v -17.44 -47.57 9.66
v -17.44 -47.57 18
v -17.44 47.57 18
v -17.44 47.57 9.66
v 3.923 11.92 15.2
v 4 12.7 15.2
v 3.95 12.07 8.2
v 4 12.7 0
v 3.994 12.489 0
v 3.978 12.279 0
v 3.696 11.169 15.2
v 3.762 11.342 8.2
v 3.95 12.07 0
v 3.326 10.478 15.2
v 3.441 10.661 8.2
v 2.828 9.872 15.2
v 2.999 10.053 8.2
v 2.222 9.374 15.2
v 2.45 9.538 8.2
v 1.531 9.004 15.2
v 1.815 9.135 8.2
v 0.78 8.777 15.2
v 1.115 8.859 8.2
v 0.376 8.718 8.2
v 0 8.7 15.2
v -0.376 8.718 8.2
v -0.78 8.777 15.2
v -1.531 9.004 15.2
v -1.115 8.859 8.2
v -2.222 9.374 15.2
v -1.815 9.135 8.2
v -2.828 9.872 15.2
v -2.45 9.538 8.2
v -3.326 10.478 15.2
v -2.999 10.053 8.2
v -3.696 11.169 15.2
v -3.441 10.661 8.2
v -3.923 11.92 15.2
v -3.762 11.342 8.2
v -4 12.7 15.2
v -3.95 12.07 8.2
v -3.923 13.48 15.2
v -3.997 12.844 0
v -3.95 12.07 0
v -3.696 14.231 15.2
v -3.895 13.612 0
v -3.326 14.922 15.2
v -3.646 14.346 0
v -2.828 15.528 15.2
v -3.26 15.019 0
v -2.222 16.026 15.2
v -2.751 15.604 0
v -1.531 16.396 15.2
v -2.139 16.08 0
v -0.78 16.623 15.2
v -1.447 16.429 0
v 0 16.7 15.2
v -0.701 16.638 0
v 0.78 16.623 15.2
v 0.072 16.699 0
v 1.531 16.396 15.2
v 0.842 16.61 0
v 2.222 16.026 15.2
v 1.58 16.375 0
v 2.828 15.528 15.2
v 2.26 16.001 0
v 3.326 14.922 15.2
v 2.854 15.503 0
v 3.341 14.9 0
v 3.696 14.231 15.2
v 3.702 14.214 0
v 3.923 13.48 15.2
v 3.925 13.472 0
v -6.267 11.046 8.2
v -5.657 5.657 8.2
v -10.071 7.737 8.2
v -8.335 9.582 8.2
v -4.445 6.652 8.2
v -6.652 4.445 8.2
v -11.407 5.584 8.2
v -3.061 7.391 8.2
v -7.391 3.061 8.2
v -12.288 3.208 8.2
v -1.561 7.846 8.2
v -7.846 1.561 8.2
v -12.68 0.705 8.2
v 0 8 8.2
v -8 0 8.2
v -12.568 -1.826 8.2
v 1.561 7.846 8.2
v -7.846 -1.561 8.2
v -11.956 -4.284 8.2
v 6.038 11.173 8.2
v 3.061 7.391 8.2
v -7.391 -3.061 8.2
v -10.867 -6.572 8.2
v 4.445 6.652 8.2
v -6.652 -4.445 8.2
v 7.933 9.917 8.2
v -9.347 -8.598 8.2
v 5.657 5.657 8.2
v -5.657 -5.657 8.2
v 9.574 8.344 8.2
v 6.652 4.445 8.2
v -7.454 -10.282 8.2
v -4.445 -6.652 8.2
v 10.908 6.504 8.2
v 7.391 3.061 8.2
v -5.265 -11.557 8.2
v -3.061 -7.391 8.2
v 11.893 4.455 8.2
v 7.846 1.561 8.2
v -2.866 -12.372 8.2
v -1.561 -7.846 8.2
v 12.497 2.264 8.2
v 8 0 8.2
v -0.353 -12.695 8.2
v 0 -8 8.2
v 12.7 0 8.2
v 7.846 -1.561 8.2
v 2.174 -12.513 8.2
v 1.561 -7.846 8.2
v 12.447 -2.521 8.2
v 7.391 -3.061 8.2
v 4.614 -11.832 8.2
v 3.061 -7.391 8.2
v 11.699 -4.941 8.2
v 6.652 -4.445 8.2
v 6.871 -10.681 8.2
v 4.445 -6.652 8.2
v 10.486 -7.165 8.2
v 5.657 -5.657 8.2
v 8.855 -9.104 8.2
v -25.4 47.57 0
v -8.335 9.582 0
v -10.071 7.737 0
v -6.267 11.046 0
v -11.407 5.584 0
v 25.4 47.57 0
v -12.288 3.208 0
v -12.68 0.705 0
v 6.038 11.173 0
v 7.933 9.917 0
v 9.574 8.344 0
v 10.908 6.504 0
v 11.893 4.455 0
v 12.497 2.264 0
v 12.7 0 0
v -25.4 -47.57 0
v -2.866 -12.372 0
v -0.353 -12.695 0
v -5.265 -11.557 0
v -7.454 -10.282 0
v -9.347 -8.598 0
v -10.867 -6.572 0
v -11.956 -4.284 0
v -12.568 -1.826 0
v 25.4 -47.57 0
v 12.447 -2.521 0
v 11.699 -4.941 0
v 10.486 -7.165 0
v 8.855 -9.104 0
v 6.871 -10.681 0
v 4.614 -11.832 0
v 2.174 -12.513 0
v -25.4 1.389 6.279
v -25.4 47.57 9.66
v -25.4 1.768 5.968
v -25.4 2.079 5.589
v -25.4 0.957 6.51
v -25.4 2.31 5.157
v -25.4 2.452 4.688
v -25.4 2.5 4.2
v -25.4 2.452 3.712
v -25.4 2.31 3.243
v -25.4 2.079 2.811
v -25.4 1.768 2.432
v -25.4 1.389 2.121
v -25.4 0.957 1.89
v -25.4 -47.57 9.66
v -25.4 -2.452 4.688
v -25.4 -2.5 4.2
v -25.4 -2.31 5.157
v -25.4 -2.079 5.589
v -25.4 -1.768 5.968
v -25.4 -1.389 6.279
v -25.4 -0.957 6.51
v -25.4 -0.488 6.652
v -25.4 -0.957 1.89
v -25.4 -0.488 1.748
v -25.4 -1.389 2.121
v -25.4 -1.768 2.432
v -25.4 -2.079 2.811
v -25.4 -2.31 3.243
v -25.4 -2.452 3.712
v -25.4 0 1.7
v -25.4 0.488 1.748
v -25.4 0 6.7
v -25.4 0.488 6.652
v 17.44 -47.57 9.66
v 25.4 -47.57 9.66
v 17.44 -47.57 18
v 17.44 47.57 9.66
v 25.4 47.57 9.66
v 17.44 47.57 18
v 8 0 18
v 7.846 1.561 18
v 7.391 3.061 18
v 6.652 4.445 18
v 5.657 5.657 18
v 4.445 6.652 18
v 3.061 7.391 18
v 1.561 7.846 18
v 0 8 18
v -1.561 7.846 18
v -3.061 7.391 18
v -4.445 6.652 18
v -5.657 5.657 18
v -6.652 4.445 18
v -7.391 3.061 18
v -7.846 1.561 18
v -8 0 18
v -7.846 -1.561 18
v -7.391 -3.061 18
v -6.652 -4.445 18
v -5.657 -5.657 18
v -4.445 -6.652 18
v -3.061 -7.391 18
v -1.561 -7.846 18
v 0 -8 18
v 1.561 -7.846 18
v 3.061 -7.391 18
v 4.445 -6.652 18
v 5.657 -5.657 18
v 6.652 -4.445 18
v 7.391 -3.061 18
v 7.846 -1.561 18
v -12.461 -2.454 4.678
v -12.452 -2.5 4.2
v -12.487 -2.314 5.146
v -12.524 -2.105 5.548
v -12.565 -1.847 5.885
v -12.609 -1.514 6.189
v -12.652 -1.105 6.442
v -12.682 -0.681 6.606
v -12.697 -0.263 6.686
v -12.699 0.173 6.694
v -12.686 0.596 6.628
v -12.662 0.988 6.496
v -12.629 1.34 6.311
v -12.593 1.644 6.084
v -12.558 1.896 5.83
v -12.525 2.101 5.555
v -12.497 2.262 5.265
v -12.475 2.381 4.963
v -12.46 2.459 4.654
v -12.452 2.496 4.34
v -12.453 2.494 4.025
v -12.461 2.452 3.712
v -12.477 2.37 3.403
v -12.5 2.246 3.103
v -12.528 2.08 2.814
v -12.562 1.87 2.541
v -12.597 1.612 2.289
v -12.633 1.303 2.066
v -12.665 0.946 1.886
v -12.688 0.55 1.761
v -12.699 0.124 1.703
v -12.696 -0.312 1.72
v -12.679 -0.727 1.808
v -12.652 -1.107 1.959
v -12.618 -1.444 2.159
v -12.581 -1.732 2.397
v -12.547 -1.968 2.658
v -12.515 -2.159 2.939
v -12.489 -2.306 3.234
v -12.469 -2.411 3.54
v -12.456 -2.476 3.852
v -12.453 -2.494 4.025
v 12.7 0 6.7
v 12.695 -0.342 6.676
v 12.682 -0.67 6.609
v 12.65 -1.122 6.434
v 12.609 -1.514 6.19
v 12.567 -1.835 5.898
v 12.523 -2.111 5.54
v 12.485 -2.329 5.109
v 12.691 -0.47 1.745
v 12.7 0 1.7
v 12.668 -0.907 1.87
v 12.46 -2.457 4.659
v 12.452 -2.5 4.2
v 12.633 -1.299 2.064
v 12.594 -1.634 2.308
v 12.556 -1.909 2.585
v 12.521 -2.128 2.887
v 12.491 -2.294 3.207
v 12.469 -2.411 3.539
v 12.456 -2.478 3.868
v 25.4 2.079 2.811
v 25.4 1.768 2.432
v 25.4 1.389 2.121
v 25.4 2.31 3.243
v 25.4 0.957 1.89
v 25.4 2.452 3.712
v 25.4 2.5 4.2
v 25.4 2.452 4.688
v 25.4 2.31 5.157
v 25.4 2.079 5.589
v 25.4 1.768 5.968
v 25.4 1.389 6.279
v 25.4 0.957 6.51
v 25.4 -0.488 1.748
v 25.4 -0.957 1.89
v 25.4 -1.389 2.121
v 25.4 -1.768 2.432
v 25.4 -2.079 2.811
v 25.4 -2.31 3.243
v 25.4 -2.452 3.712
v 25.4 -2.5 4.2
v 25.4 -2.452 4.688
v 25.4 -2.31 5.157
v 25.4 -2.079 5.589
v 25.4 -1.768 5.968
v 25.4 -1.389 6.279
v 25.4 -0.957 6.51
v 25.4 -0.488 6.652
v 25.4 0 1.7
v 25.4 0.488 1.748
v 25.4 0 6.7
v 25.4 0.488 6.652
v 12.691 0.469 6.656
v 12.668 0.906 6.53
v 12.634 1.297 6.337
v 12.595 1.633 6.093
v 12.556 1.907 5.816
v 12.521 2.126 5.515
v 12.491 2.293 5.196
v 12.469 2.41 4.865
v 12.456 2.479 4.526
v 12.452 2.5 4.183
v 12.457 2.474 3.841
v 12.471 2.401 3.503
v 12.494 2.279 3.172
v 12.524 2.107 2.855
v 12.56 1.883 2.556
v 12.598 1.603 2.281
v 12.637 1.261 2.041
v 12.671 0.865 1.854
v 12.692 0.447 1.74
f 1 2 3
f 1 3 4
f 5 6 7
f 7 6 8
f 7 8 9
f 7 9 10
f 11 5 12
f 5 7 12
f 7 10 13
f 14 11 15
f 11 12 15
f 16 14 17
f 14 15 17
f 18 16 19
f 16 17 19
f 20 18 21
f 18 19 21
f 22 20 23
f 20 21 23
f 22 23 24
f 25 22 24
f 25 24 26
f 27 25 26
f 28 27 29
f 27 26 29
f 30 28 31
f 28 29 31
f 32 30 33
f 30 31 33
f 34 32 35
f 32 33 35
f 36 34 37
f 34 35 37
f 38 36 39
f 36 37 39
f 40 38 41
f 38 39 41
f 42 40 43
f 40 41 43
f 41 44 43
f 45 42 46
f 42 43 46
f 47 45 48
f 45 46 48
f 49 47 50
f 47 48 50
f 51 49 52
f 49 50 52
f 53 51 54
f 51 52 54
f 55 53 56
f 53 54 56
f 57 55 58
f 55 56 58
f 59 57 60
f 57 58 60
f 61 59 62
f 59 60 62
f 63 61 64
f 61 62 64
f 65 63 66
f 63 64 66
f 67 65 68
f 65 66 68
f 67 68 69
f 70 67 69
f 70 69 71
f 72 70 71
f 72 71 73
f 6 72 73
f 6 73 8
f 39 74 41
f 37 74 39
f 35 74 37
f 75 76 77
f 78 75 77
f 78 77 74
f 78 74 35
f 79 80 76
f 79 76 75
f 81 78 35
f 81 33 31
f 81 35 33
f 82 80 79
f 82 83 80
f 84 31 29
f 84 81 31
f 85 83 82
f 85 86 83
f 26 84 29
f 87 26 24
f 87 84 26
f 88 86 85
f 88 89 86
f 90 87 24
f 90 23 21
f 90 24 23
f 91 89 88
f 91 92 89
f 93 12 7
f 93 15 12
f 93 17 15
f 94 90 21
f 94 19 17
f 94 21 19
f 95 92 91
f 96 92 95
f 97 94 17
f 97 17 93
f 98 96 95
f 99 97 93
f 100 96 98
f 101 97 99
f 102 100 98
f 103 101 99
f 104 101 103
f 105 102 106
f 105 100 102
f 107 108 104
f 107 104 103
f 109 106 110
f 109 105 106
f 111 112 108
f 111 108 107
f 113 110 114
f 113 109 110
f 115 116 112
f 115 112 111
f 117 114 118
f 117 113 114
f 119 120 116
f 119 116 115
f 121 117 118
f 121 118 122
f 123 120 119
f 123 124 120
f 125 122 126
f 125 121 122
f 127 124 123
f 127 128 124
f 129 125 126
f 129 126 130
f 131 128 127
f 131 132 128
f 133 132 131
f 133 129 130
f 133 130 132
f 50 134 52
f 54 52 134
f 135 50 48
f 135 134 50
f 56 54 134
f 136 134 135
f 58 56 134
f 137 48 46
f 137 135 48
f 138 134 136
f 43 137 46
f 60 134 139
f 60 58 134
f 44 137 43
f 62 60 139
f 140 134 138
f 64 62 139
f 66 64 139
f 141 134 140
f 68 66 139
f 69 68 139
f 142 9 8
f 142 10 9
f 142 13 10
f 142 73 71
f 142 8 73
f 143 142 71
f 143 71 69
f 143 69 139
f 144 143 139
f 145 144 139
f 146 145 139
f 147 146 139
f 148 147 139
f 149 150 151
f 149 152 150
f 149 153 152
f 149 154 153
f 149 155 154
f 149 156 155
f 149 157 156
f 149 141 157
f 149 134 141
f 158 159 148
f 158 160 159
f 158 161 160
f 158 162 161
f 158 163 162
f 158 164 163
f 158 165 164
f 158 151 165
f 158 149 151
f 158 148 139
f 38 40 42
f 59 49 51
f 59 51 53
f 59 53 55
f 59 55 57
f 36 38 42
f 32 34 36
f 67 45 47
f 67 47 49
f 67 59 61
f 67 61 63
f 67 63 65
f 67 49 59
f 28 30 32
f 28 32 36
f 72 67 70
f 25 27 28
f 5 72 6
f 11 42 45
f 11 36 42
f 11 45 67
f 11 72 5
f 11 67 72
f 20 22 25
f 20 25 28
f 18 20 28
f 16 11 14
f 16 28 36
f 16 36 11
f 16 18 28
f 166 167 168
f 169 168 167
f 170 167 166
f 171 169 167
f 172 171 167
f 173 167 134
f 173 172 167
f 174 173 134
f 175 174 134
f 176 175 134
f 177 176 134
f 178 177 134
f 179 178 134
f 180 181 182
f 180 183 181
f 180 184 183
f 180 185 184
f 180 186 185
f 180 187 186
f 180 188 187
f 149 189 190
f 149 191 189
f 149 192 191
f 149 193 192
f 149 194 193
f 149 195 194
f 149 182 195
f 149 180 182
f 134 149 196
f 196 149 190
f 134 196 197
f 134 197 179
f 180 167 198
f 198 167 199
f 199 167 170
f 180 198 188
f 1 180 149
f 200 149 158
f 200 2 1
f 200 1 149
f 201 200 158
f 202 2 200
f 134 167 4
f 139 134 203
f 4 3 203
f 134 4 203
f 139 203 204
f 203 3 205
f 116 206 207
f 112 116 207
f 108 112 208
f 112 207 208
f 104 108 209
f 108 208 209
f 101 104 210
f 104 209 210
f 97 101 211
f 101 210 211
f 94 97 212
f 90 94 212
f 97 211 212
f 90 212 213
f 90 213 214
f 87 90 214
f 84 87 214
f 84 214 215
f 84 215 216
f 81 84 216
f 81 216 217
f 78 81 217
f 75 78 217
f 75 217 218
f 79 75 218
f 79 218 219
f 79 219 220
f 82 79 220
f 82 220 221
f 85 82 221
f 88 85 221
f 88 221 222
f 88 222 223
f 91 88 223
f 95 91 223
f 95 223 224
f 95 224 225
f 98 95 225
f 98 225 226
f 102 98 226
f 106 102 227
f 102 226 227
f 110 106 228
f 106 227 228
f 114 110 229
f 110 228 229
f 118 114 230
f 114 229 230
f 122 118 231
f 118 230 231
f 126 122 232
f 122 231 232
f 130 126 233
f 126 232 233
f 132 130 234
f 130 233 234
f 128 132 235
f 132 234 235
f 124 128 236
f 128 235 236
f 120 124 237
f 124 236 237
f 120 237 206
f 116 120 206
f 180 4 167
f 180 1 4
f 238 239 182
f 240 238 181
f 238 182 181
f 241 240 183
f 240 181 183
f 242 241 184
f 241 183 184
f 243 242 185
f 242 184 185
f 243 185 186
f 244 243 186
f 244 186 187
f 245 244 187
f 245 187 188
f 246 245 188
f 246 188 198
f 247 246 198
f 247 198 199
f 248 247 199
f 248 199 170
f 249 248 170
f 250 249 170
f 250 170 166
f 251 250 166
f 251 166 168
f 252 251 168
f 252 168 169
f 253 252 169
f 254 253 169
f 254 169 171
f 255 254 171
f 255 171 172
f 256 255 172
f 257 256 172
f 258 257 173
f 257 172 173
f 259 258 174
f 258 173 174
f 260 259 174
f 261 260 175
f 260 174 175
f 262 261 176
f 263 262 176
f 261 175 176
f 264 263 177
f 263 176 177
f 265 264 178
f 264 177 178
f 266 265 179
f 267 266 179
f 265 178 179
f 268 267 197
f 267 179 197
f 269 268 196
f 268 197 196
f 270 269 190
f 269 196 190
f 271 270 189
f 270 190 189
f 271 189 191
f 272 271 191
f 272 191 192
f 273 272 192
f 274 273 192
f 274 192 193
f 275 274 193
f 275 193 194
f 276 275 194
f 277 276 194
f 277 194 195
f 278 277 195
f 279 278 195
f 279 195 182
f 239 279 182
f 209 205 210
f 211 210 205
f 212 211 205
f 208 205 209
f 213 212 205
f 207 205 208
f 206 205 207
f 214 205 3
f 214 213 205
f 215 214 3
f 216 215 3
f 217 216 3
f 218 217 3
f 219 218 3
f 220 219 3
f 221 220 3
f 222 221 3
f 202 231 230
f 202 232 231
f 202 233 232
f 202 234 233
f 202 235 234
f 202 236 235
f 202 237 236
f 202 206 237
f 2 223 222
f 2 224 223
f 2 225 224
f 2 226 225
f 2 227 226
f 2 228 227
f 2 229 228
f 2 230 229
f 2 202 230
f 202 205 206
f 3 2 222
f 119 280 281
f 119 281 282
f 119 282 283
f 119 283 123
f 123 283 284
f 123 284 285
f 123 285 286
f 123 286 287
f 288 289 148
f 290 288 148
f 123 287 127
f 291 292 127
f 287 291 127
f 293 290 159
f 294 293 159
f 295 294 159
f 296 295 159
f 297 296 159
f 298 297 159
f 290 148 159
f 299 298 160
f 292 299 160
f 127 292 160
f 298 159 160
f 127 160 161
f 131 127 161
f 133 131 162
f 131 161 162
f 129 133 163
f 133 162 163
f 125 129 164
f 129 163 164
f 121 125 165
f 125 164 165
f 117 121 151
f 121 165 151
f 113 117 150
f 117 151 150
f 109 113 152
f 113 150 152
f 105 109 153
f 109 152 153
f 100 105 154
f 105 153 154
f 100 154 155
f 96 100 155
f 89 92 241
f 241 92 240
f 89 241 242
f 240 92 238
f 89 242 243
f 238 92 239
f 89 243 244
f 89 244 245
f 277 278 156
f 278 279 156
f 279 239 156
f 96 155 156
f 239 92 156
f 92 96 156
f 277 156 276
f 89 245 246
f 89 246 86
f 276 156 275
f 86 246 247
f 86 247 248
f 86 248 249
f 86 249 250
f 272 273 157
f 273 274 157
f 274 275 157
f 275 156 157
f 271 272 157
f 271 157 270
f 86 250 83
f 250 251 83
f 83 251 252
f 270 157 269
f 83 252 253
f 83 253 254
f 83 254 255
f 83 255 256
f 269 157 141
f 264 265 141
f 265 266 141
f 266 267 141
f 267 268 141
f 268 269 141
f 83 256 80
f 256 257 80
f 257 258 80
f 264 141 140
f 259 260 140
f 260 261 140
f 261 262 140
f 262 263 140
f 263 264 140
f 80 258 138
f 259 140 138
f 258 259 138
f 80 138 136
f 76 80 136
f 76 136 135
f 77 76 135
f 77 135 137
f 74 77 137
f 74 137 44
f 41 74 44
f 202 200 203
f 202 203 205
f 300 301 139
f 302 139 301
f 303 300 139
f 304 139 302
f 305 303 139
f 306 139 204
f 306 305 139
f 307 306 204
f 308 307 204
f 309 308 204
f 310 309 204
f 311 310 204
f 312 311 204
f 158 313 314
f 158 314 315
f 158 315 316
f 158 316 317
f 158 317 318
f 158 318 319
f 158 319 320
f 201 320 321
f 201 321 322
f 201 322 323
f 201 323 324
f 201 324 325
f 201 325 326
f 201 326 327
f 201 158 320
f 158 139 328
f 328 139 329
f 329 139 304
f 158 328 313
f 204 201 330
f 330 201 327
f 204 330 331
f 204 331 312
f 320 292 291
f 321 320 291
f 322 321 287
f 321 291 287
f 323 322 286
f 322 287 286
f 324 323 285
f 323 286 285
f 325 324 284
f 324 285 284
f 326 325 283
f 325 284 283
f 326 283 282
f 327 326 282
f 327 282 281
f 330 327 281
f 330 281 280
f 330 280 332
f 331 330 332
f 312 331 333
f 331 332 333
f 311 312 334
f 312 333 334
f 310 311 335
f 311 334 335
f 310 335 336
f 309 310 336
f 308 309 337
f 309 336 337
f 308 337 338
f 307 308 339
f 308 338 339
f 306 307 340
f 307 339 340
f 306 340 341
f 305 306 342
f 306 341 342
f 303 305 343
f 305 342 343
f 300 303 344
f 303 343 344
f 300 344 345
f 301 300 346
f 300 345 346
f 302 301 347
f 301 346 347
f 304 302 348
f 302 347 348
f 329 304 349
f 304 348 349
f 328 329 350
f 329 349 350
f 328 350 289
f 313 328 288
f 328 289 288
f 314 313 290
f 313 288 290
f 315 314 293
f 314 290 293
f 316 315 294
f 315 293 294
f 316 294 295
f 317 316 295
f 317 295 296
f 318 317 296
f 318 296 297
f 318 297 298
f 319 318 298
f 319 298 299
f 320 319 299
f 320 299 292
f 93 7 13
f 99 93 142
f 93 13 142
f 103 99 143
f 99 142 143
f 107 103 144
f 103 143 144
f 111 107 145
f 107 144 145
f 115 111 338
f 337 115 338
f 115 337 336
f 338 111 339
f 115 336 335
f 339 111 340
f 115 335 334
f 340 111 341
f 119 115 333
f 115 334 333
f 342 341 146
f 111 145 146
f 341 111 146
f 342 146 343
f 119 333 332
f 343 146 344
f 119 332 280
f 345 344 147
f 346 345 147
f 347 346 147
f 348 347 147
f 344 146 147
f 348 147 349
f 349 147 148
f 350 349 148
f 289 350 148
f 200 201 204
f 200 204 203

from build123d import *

# Parameters (mm, degrees)
F1_DEPTH = 47.57
F2_R     = 8
F3_DEPTH = 25
F4_R     = 12.7
F5_DEPTH = 8.2
F6_R     = 2.5
F7_DEPTH = 50.801
F8_R     = 4
F9_DEPTH = 15.2


with BuildPart() as f1:
    # F0 (on Front) → F1 (new body, symmetric)
    with BuildSketch(Plane.XZ):
        Polygon((-25.4, 0), (0, 0), (25.4, 0), (25.4, 9.66), (17.44, 9.66), (17.44, 18), (0, 18), (-17.44, 18), (-17.44, 9.66), (-25.4, 9.66), align=None)
    extrude(amount=F1_DEPTH, both=True)

    # F2 (on face) → F3 (cut)
    with BuildSketch(Plane.XY.offset(18)):
        Circle(F2_R)
    extrude(amount=-F3_DEPTH, mode=Mode.SUBTRACT)

    # F4 (on face) → F5 (cut)
    with BuildSketch(Plane(origin=(0, 0, 0), x_dir=(1, 0, 0), z_dir=(0, 0, -1))):
        Circle(F4_R)
    extrude(amount=-F5_DEPTH, mode=Mode.SUBTRACT)

    # F6 (on face) → F7 (cut, through all)
    with BuildSketch(Plane(origin=(-25.4, 0, 0), x_dir=(0, -1, 0), z_dir=(-1, 0, 0))):
        with Locations((0, 4.2)):
            Circle(F6_R)
    extrude(amount=-F7_DEPTH, mode=Mode.SUBTRACT)

    # F8 (on face) → F9 (cut)
    with BuildSketch(Plane(origin=(0, 0, 0), x_dir=(1, 0, 0), z_dir=(0, 0, -1))):
        with Locations((0, -12.7)):
            Circle(F8_R)
    extrude(amount=-F9_DEPTH, mode=Mode.SUBTRACT)


solid = f1.part
